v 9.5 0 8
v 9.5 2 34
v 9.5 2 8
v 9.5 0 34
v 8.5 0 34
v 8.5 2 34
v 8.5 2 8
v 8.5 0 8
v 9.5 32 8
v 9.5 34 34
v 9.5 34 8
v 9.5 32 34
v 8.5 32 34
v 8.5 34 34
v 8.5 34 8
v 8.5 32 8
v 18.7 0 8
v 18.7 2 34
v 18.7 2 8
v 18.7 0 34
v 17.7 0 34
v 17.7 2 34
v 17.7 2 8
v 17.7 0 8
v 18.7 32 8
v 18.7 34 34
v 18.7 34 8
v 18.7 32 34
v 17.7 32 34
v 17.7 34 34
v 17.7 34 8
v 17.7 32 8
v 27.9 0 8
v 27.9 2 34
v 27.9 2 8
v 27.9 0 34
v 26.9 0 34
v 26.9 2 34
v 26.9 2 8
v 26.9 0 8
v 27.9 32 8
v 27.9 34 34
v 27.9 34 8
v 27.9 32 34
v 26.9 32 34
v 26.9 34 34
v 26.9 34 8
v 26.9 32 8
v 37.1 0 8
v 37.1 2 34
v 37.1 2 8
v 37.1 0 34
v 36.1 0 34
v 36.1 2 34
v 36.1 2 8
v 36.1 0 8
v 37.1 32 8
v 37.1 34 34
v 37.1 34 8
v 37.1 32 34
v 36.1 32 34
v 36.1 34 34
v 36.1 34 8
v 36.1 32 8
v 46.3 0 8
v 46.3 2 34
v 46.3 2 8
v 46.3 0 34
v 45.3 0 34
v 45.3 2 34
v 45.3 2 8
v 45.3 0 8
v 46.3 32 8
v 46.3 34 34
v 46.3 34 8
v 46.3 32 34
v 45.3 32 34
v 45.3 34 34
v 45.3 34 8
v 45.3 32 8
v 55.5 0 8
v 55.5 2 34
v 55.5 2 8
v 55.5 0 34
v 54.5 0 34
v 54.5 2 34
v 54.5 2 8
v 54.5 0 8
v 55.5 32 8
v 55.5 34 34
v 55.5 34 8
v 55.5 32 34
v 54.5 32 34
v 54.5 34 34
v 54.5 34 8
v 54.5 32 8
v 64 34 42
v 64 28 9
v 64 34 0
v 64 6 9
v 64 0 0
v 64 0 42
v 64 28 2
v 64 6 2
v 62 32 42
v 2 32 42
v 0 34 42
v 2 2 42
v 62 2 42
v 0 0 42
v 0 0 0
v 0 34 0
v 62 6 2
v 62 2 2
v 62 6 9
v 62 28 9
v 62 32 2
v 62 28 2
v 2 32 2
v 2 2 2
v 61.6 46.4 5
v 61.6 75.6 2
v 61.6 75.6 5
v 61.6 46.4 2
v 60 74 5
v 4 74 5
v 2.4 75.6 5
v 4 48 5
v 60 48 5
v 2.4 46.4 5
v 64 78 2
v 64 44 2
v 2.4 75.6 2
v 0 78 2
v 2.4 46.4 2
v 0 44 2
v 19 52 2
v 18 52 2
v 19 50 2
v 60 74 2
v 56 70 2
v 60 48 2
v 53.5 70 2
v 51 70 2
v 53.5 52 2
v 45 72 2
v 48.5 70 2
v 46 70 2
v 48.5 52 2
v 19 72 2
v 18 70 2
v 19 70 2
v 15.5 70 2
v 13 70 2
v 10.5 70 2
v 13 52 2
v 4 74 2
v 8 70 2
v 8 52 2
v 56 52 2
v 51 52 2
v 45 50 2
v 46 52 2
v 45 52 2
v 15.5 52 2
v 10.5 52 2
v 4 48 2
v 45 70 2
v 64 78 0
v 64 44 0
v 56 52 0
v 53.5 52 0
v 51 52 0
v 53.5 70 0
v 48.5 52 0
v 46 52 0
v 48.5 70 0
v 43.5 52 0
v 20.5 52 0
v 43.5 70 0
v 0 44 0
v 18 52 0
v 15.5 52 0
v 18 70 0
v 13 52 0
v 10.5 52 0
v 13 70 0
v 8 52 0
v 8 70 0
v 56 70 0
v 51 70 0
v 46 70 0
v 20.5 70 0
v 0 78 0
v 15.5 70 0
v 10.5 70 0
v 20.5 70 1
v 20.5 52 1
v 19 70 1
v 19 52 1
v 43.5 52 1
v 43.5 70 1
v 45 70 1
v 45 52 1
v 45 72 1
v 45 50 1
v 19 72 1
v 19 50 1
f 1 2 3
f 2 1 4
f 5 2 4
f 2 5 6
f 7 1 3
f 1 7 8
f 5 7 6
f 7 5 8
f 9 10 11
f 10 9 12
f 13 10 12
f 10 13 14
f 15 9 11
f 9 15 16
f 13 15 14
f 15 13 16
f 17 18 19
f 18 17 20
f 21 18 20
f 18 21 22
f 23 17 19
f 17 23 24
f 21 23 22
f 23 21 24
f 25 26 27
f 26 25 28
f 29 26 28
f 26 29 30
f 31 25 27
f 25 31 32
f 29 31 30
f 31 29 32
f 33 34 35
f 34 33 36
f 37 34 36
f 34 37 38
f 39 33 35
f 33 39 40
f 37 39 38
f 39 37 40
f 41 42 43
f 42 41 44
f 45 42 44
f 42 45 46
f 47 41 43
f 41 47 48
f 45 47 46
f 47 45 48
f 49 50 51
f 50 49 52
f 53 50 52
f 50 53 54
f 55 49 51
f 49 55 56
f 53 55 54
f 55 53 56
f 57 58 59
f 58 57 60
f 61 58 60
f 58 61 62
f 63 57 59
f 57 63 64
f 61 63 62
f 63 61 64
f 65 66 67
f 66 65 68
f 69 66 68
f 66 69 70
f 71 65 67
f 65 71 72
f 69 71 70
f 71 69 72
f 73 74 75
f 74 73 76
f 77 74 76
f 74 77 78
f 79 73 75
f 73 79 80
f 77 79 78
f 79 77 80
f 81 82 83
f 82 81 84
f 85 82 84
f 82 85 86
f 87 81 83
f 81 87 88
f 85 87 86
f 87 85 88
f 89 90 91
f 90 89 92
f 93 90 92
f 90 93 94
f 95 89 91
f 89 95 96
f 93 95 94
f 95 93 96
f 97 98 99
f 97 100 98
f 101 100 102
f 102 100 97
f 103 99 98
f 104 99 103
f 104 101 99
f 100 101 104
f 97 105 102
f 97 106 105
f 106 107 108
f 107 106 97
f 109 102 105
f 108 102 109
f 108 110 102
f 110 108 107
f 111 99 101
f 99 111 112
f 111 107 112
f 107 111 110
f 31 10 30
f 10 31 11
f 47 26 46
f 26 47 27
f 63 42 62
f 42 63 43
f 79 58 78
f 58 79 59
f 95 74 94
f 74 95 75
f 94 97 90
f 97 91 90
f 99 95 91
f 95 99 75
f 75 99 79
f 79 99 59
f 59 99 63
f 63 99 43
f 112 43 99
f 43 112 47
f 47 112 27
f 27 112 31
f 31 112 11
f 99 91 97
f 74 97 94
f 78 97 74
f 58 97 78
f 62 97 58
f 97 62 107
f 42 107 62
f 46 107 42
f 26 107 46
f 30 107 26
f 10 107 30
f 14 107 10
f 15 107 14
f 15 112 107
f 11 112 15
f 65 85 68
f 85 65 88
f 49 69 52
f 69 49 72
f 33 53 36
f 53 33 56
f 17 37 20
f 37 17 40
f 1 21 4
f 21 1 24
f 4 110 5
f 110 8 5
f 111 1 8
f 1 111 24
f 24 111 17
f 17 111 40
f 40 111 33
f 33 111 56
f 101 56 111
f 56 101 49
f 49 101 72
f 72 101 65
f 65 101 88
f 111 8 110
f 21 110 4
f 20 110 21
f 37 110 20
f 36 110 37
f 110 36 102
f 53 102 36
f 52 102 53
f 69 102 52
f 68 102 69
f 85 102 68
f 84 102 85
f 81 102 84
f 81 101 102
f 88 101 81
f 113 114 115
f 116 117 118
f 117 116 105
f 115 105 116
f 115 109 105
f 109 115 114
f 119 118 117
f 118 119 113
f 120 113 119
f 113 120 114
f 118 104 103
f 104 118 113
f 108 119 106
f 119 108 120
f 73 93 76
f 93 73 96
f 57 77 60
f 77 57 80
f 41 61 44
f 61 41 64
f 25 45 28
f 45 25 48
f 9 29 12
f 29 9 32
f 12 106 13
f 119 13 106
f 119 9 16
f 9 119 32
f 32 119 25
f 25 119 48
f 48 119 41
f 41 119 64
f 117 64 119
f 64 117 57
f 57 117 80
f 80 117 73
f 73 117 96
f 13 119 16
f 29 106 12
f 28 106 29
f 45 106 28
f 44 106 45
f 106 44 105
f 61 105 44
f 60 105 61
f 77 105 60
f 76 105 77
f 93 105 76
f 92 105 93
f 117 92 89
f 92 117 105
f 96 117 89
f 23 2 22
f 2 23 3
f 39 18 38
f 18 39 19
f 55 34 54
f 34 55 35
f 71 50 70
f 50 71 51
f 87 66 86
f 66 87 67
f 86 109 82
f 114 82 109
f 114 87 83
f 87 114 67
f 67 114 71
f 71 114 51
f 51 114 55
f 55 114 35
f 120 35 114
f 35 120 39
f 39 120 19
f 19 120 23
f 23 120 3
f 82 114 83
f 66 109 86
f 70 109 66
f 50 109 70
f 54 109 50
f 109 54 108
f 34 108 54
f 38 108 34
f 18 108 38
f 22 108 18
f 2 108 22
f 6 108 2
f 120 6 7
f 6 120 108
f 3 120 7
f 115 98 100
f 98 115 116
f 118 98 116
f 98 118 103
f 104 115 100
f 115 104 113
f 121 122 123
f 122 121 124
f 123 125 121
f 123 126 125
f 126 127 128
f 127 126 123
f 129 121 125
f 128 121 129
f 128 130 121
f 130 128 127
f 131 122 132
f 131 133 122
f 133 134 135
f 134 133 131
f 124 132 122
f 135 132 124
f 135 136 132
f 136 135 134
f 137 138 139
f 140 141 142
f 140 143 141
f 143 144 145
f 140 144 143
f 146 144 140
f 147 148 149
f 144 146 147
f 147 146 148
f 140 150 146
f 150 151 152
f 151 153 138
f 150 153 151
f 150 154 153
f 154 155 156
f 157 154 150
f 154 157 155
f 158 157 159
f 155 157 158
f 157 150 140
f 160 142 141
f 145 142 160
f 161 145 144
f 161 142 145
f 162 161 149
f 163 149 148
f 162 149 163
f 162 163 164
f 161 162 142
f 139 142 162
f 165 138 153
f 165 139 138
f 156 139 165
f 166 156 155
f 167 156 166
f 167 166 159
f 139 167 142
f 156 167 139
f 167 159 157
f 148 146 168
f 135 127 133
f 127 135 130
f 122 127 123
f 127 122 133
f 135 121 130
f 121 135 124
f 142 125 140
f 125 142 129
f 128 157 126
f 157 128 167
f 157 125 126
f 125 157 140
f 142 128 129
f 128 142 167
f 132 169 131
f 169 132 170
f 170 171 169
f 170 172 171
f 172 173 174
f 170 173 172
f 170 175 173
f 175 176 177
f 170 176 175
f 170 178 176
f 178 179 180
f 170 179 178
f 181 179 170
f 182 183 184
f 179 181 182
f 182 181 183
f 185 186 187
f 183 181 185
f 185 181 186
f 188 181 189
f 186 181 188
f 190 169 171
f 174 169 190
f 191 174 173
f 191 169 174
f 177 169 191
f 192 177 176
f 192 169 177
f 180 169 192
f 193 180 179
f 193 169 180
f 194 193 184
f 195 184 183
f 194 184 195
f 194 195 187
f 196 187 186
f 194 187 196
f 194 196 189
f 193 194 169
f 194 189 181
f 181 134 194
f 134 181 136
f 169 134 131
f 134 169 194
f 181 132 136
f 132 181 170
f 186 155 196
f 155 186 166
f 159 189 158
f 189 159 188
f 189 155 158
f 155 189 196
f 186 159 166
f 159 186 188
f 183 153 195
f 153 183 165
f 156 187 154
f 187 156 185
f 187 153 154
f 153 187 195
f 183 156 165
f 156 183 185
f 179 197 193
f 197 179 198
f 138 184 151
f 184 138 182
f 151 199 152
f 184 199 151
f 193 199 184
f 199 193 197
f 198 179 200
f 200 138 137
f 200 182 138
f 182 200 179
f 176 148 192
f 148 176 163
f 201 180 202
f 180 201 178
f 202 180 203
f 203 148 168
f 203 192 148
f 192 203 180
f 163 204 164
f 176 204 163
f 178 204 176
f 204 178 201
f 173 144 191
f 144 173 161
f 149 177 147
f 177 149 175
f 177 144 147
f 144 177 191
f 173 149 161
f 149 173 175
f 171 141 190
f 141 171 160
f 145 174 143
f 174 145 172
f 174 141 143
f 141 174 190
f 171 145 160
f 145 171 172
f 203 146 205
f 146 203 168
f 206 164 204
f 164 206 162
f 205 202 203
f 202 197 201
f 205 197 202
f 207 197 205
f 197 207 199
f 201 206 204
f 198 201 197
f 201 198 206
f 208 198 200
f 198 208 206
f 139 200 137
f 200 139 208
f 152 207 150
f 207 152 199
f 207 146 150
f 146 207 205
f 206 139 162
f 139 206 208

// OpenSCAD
// Sentry Sonar — sensor-node enclosure
// INTERNAL cavity 60 (L) x 30 (W) x 40 (H) mm. Body + drop-in lid.
// Outer size is derived from the wall thickness (see below).
// Vent slits on the long walls and the lid; a 5 mm-tall USB-C opening on one
// short side. Print in PLA or PETG (radar-transparent) — never carbon-fibre /
// metal-filled filament, or the 24 GHz radar won't see out.
//
// Render one part at a time:
//   openscad -D 'part="body"' -o sensor-node-box-body.stl sensor-node-box.scad
//   openscad -D 'part="lid"'  -o sensor-node-box-lid.stl  sensor-node-box.scad

part = "all";      // "body" | "lid" | "all" (all = both, laid out for preview)

/* ---- Internal (usable) cavity, mm ---- */
IL = 60;           // internal length (X)
IW = 30;           // internal width  (Y)
IH = 40;           // internal height (Z), floor to lid underside

/* ---- Shell ---- */
wall = 2;          // side wall thickness
floor_t = 2;       // floor thickness
lid_t = 2;         // lid plate thickness
tol = 0.4;         // fit clearance for the lid lip

/* ---- USB-C opening (on the +X short side) ---- */
usb_w = 22;        // width  (Y) — room for two USB-C connectors side by side
usb_h = 7;         // height (Z) — the USB-C slit (~0.7 cm)
usb_z0 = 0;        // flush with the inner floor (no gap)

/* ---- Vent slits on the two long walls (+/-Y) ---- */
vent_w = 1.0;
vent_h = 26;
vent_n = 6;
vent_end_margin = 9;   // keep slits clear of the short ends

/* ---- Vent slits on the lid (two clusters flanking the radar window) ---- */
lid_vent_w = 2.5;
lid_vent_len = 18;
lid_vent_per_end = 3;
lid_vent_gap = 5;

/* ---- Radar window on the lid (thinned panel; radar antenna faces the lid) ---- */
win_l = 26;        // window length (X)
win_w = 22;        // window width  (Y)
window_t = 1;      // remaining thickness over the window (radar-transparent)

$fn = 48;

/* ---- Derived outer dimensions ---- */
L = IL + 2 * wall;         // outer length -> 64
W = IW + 2 * wall;         // outer width  -> 34
body_h = floor_t + IH;     // outer body height (open top) -> 42
// total outer height = body_h + lid_t -> 44

// ---------------------------------------------------------------- body
module long_wall_vents() {
    step = (L - 2 * vent_end_margin) / (vent_n - 1);
    z0 = (body_h - vent_h) / 2;
    for (i = [0 : vent_n - 1]) {
        x = vent_end_margin + i * step - vent_w / 2;
        translate([x, -1, z0]) cube([vent_w, wall + 2, vent_h]);            // -Y
        translate([x, W - wall - 1, z0]) cube([vent_w, wall + 2, vent_h]);  // +Y
    }
}

module body() {
    difference() {
        cube([L, W, body_h]);
        // hollow interior (open top): exactly IL x IW, full height and above
        translate([wall, wall, floor_t])
            cube([IL, IW, body_h]);
        // USB-C opening on the +X short side
        translate([L - wall - 1, (W - usb_w) / 2, floor_t + usb_z0])
            cube([wall + 2, usb_w, usb_h]);
        long_wall_vents();
    }
}

// ---------------------------------------------------------------- lid
// Vent clusters near each short end (slots run in Y), leaving the centre clear
// for the radar window.
module lid_vents() {
    span = (lid_vent_per_end - 1) * lid_vent_gap + lid_vent_w;
    for (side = [0, 1]) {
        base_x = (side == 0) ? 8 : L - 8 - span;
        for (i = [0 : lid_vent_per_end - 1]) {
            x = base_x + i * lid_vent_gap;
            translate([x, (W - lid_vent_len) / 2, -1])
                cube([lid_vent_w, lid_vent_len, lid_t + 2]);
        }
    }
}

// Radar window: thin the central panel from the interior side so the outer face
// stays flush (and prints support-free). Leaves `window_t` of solid plastic.
module radar_window() {
    translate([(L - win_l) / 2, (W - win_w) / 2, window_t])
        cube([win_l, win_w, lid_t - window_t + 0.01]);
}

module lid() {
    // Printed plate-down with the locating lip pointing UP; flip to assemble.
    lip_out_l = IL - 2 * tol;
    lip_out_w = IW - 2 * tol;
    lip_wall = 1.6;
    lip_h = 3;
    difference() {
        union() {
            cube([L, W, lid_t]);
            translate([(L - lip_out_l) / 2, (W - lip_out_w) / 2, lid_t])
                difference() {
                    cube([lip_out_l, lip_out_w, lip_h]);
                    translate([lip_wall, lip_wall, -1])
                        cube([lip_out_l - 2 * lip_wall, lip_out_w - 2 * lip_wall, lip_h + 2]);
                }
        }
        lid_vents();
        radar_window();
    }
}

// ---------------------------------------------------------------- layout
if (part == "body" || part == "all") body();
if (part == "lid"  || part == "all") translate([0, W + 10, 0]) lid();
